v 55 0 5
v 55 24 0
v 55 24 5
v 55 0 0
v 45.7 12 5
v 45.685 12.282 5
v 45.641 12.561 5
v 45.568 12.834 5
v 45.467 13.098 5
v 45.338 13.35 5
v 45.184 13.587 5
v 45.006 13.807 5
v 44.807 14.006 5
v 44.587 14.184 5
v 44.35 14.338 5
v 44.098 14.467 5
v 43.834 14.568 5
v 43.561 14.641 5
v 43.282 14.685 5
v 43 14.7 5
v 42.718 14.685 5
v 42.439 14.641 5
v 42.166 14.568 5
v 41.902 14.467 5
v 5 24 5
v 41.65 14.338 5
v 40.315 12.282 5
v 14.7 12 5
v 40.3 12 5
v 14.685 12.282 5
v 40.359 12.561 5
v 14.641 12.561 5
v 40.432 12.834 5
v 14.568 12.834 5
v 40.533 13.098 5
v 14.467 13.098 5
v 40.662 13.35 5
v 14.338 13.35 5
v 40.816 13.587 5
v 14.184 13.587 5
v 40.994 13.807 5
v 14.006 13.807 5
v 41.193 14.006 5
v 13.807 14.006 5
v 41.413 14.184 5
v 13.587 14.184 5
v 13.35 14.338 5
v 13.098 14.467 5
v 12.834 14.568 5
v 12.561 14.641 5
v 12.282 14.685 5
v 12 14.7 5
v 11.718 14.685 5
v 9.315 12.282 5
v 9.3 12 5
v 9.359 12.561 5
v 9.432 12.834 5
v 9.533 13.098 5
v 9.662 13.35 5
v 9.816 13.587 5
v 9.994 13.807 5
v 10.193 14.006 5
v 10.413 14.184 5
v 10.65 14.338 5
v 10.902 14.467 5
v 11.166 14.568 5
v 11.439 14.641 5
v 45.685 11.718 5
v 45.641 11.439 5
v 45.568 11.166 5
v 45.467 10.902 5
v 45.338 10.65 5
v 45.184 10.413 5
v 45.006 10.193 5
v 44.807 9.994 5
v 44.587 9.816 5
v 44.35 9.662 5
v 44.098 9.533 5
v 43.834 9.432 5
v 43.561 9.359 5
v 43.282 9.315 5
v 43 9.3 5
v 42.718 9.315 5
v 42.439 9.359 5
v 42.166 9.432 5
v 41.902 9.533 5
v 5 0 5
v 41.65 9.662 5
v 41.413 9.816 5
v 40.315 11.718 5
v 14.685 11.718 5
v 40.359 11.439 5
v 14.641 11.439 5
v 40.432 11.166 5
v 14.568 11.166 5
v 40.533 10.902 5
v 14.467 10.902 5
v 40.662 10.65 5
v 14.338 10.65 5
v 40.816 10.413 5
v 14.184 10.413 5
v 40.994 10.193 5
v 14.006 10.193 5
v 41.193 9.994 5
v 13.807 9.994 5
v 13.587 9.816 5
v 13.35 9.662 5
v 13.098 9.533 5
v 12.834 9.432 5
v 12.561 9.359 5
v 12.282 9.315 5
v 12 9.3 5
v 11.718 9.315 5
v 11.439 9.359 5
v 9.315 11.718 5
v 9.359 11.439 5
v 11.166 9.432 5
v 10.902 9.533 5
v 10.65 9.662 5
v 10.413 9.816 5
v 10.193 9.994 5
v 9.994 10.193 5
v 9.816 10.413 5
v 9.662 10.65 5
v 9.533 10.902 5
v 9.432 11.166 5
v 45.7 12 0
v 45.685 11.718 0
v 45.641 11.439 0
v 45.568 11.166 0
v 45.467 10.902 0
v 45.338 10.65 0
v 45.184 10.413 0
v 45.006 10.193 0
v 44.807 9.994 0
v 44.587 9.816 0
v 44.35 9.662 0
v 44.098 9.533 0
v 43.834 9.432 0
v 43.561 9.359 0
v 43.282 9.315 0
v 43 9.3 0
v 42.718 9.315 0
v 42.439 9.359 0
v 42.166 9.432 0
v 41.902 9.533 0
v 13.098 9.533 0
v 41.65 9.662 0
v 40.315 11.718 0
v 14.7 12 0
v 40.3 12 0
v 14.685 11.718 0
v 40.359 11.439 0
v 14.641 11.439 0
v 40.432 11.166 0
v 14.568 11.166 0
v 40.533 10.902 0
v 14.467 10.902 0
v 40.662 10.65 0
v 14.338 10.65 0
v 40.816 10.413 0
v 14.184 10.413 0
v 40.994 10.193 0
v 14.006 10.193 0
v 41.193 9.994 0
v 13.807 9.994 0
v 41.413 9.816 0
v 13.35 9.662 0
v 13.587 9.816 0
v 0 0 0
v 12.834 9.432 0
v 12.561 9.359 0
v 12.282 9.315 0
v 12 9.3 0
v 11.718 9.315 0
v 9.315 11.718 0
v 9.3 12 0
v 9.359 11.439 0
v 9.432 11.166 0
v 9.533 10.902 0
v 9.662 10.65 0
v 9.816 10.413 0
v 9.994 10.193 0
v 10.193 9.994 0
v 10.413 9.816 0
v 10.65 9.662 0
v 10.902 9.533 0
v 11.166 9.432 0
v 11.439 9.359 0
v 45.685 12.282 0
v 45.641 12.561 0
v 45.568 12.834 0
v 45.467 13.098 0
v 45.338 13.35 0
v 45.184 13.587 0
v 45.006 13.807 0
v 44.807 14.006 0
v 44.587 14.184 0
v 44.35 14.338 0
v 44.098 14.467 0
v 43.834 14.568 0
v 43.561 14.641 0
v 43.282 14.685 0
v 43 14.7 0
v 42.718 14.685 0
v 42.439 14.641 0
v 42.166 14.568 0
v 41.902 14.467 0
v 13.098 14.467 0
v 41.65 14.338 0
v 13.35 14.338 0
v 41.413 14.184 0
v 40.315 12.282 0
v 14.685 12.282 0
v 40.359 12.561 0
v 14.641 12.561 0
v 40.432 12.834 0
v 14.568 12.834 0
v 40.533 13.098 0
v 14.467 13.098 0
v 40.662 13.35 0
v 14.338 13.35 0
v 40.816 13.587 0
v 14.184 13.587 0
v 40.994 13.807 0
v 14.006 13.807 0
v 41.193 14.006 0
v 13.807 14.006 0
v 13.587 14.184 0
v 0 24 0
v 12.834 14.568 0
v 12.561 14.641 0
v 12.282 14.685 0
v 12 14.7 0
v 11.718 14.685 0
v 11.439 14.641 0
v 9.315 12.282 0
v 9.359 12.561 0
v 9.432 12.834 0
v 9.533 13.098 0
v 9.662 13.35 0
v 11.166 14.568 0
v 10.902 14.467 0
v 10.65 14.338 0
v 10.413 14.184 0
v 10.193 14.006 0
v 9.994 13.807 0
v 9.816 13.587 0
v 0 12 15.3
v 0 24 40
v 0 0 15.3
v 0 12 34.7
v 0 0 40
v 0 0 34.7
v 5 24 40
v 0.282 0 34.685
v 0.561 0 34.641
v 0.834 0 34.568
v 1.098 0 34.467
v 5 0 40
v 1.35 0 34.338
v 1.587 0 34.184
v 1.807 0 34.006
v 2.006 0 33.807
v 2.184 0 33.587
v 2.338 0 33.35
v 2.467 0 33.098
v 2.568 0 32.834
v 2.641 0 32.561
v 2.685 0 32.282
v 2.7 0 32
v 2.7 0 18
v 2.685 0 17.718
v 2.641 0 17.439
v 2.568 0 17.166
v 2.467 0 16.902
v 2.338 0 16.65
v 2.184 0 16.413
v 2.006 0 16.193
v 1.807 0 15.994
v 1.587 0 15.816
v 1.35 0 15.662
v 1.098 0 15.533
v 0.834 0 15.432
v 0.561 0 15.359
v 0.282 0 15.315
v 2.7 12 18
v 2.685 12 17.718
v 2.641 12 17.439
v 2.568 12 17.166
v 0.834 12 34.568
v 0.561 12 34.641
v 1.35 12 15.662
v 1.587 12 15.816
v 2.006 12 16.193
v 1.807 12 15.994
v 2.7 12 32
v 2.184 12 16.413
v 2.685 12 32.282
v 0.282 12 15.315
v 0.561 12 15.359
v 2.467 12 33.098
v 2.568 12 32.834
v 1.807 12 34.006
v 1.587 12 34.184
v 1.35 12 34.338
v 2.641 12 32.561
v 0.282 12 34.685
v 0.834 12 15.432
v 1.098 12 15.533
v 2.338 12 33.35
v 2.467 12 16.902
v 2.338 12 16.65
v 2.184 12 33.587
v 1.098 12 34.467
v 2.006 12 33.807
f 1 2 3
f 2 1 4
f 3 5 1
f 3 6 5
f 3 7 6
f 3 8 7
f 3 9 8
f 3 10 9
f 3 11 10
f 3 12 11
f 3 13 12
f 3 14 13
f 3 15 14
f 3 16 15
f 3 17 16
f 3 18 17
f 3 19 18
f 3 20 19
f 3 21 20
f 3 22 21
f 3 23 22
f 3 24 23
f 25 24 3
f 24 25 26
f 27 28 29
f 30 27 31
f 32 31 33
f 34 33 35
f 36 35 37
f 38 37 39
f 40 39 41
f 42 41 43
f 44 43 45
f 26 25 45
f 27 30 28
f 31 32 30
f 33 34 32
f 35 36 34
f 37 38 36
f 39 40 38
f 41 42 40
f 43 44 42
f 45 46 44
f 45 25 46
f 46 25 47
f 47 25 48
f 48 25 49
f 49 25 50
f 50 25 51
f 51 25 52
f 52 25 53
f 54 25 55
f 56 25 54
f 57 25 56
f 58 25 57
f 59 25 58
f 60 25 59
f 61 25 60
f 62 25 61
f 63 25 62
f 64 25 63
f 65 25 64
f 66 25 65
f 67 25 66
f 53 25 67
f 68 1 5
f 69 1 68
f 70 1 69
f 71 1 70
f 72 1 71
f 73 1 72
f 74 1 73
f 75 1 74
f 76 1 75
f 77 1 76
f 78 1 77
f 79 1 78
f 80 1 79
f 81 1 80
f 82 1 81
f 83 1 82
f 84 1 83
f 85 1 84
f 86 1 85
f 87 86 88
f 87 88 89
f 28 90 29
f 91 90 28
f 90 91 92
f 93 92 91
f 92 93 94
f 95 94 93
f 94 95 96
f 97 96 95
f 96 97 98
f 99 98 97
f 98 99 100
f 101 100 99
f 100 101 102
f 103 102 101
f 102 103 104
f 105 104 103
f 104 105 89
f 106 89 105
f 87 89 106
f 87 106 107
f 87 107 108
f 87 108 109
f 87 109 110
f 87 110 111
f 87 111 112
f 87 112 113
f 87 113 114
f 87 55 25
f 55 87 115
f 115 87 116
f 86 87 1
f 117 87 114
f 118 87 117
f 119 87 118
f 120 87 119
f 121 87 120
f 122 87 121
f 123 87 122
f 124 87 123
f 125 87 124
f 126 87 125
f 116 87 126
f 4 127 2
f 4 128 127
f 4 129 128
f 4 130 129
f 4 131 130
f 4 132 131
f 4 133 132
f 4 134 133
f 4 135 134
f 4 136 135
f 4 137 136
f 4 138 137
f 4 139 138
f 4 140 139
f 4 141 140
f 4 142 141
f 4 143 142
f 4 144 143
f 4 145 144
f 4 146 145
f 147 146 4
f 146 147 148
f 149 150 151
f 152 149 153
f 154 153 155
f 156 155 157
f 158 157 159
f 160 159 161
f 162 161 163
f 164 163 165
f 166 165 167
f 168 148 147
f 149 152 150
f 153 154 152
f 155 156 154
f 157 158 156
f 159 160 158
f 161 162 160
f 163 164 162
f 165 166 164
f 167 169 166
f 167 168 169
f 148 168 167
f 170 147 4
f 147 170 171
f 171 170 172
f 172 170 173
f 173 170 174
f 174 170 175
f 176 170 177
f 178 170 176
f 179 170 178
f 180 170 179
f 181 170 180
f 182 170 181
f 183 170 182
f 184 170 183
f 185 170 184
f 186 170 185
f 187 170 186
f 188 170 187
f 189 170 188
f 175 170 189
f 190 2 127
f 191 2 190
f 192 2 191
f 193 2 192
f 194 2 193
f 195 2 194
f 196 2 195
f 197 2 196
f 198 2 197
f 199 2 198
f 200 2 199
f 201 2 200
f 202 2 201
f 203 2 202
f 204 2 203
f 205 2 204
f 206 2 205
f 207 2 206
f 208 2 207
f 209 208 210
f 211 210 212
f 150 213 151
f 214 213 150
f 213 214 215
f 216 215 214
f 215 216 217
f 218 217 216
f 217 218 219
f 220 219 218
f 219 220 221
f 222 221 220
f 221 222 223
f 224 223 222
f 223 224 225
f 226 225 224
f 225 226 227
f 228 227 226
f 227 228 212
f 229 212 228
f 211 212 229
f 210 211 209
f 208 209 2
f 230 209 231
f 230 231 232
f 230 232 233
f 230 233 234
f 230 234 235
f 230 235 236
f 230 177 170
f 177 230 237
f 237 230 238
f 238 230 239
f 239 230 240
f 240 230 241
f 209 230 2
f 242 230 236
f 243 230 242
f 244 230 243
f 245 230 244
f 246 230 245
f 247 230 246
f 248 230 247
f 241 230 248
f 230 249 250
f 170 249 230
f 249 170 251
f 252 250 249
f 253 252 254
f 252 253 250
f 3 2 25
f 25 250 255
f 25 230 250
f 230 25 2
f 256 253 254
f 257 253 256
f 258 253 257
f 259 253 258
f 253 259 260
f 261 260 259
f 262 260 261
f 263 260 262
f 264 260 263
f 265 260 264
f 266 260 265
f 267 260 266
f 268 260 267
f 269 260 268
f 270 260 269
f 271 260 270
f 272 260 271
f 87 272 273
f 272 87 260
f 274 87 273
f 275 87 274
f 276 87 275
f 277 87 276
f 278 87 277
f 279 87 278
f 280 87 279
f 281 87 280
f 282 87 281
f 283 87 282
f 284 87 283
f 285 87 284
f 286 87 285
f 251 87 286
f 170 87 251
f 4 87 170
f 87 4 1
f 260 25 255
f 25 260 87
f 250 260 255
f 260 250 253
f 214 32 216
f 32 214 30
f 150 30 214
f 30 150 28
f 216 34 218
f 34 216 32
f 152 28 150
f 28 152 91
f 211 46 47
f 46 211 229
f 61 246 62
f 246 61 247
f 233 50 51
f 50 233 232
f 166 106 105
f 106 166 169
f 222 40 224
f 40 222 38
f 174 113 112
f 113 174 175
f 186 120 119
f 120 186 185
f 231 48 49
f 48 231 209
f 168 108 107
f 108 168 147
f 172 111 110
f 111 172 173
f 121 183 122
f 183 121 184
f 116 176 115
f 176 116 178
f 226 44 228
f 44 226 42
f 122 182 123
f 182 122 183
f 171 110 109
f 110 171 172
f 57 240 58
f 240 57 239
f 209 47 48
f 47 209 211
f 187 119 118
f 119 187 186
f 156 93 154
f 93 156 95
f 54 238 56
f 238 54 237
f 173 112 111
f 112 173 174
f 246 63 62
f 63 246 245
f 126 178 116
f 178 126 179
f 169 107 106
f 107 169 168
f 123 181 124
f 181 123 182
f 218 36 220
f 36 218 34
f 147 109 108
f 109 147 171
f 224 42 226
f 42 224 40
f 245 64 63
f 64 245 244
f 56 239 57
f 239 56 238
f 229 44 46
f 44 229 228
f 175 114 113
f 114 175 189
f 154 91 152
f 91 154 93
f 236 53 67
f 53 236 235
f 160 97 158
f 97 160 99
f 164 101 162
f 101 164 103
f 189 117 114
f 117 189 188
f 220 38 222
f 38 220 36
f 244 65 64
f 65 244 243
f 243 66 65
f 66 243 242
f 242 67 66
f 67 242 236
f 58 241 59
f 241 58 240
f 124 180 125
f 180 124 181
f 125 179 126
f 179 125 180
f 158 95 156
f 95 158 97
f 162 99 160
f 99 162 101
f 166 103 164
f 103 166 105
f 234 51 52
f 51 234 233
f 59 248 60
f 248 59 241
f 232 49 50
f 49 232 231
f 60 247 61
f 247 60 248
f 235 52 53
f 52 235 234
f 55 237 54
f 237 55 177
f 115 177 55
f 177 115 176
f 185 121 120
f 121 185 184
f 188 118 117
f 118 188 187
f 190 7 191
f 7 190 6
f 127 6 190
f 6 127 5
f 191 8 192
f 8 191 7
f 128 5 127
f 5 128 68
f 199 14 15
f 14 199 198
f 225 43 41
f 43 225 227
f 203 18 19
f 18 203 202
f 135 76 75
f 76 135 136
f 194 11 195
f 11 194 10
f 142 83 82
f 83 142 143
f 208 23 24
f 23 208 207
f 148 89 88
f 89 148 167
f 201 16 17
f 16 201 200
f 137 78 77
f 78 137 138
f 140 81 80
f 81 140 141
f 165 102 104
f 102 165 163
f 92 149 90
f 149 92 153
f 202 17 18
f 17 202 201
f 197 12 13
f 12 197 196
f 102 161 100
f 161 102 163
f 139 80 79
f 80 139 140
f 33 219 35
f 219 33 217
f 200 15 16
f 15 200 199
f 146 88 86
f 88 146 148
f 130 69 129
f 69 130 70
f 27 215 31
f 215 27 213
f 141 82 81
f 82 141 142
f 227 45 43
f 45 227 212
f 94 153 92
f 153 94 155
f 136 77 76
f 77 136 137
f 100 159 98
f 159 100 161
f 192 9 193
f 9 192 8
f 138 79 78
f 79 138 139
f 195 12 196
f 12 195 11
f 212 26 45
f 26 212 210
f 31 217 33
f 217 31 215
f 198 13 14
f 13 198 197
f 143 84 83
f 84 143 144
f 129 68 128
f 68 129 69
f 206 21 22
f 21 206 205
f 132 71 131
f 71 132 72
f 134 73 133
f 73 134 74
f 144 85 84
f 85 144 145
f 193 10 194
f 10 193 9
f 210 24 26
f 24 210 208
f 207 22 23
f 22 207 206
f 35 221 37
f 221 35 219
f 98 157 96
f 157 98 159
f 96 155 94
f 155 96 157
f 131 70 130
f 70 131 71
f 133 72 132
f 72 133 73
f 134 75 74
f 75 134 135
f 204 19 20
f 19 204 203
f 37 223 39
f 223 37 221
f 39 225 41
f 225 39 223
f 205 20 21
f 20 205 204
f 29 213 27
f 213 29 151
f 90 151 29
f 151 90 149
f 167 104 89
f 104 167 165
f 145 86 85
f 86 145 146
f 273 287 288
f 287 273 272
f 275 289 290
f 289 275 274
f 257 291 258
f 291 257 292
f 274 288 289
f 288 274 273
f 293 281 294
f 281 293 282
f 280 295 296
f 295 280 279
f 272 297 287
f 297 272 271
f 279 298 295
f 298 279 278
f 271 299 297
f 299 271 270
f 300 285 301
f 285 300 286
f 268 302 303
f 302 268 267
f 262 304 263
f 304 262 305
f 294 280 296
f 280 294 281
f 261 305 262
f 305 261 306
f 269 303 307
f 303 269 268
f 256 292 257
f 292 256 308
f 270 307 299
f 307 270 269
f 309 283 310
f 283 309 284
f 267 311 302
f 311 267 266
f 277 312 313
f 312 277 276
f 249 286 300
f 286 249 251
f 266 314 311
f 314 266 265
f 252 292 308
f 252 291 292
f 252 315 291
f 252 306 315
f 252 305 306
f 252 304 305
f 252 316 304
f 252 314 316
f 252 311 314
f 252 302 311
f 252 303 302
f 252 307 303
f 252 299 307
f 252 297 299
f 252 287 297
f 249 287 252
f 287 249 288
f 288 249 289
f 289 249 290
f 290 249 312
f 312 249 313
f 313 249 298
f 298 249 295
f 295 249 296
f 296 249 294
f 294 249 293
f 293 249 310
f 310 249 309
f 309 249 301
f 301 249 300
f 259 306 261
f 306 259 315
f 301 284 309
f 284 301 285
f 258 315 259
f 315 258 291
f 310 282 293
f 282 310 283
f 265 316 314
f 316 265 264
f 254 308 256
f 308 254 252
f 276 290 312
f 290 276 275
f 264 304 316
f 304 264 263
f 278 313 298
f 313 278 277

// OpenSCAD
// Adjustable L bracket with upright slot.
$fn = 60;
eps = 0.02;
base_l = 55;
upright_h = 40;
width = 24;
thickness = 5;
slot_l = 14;
module vertical_slot() { hull() { translate([0,width/2,thickness+upright_h/2-slot_l/2]) rotate([90,0,0]) cylinder(d=5.4,h=width+2*eps); translate([0,width/2,thickness+upright_h/2+slot_l/2]) rotate([90,0,0]) cylinder(d=5.4,h=width+2*eps); } }
difference() {
    union() { cube([base_l,width,thickness]); cube([thickness,width,upright_h]); }
    for(x=[12,base_l-12]) translate([x,width/2,-eps]) cylinder(d=5.4,h=thickness+2*eps);
    vertical_slot();
}
